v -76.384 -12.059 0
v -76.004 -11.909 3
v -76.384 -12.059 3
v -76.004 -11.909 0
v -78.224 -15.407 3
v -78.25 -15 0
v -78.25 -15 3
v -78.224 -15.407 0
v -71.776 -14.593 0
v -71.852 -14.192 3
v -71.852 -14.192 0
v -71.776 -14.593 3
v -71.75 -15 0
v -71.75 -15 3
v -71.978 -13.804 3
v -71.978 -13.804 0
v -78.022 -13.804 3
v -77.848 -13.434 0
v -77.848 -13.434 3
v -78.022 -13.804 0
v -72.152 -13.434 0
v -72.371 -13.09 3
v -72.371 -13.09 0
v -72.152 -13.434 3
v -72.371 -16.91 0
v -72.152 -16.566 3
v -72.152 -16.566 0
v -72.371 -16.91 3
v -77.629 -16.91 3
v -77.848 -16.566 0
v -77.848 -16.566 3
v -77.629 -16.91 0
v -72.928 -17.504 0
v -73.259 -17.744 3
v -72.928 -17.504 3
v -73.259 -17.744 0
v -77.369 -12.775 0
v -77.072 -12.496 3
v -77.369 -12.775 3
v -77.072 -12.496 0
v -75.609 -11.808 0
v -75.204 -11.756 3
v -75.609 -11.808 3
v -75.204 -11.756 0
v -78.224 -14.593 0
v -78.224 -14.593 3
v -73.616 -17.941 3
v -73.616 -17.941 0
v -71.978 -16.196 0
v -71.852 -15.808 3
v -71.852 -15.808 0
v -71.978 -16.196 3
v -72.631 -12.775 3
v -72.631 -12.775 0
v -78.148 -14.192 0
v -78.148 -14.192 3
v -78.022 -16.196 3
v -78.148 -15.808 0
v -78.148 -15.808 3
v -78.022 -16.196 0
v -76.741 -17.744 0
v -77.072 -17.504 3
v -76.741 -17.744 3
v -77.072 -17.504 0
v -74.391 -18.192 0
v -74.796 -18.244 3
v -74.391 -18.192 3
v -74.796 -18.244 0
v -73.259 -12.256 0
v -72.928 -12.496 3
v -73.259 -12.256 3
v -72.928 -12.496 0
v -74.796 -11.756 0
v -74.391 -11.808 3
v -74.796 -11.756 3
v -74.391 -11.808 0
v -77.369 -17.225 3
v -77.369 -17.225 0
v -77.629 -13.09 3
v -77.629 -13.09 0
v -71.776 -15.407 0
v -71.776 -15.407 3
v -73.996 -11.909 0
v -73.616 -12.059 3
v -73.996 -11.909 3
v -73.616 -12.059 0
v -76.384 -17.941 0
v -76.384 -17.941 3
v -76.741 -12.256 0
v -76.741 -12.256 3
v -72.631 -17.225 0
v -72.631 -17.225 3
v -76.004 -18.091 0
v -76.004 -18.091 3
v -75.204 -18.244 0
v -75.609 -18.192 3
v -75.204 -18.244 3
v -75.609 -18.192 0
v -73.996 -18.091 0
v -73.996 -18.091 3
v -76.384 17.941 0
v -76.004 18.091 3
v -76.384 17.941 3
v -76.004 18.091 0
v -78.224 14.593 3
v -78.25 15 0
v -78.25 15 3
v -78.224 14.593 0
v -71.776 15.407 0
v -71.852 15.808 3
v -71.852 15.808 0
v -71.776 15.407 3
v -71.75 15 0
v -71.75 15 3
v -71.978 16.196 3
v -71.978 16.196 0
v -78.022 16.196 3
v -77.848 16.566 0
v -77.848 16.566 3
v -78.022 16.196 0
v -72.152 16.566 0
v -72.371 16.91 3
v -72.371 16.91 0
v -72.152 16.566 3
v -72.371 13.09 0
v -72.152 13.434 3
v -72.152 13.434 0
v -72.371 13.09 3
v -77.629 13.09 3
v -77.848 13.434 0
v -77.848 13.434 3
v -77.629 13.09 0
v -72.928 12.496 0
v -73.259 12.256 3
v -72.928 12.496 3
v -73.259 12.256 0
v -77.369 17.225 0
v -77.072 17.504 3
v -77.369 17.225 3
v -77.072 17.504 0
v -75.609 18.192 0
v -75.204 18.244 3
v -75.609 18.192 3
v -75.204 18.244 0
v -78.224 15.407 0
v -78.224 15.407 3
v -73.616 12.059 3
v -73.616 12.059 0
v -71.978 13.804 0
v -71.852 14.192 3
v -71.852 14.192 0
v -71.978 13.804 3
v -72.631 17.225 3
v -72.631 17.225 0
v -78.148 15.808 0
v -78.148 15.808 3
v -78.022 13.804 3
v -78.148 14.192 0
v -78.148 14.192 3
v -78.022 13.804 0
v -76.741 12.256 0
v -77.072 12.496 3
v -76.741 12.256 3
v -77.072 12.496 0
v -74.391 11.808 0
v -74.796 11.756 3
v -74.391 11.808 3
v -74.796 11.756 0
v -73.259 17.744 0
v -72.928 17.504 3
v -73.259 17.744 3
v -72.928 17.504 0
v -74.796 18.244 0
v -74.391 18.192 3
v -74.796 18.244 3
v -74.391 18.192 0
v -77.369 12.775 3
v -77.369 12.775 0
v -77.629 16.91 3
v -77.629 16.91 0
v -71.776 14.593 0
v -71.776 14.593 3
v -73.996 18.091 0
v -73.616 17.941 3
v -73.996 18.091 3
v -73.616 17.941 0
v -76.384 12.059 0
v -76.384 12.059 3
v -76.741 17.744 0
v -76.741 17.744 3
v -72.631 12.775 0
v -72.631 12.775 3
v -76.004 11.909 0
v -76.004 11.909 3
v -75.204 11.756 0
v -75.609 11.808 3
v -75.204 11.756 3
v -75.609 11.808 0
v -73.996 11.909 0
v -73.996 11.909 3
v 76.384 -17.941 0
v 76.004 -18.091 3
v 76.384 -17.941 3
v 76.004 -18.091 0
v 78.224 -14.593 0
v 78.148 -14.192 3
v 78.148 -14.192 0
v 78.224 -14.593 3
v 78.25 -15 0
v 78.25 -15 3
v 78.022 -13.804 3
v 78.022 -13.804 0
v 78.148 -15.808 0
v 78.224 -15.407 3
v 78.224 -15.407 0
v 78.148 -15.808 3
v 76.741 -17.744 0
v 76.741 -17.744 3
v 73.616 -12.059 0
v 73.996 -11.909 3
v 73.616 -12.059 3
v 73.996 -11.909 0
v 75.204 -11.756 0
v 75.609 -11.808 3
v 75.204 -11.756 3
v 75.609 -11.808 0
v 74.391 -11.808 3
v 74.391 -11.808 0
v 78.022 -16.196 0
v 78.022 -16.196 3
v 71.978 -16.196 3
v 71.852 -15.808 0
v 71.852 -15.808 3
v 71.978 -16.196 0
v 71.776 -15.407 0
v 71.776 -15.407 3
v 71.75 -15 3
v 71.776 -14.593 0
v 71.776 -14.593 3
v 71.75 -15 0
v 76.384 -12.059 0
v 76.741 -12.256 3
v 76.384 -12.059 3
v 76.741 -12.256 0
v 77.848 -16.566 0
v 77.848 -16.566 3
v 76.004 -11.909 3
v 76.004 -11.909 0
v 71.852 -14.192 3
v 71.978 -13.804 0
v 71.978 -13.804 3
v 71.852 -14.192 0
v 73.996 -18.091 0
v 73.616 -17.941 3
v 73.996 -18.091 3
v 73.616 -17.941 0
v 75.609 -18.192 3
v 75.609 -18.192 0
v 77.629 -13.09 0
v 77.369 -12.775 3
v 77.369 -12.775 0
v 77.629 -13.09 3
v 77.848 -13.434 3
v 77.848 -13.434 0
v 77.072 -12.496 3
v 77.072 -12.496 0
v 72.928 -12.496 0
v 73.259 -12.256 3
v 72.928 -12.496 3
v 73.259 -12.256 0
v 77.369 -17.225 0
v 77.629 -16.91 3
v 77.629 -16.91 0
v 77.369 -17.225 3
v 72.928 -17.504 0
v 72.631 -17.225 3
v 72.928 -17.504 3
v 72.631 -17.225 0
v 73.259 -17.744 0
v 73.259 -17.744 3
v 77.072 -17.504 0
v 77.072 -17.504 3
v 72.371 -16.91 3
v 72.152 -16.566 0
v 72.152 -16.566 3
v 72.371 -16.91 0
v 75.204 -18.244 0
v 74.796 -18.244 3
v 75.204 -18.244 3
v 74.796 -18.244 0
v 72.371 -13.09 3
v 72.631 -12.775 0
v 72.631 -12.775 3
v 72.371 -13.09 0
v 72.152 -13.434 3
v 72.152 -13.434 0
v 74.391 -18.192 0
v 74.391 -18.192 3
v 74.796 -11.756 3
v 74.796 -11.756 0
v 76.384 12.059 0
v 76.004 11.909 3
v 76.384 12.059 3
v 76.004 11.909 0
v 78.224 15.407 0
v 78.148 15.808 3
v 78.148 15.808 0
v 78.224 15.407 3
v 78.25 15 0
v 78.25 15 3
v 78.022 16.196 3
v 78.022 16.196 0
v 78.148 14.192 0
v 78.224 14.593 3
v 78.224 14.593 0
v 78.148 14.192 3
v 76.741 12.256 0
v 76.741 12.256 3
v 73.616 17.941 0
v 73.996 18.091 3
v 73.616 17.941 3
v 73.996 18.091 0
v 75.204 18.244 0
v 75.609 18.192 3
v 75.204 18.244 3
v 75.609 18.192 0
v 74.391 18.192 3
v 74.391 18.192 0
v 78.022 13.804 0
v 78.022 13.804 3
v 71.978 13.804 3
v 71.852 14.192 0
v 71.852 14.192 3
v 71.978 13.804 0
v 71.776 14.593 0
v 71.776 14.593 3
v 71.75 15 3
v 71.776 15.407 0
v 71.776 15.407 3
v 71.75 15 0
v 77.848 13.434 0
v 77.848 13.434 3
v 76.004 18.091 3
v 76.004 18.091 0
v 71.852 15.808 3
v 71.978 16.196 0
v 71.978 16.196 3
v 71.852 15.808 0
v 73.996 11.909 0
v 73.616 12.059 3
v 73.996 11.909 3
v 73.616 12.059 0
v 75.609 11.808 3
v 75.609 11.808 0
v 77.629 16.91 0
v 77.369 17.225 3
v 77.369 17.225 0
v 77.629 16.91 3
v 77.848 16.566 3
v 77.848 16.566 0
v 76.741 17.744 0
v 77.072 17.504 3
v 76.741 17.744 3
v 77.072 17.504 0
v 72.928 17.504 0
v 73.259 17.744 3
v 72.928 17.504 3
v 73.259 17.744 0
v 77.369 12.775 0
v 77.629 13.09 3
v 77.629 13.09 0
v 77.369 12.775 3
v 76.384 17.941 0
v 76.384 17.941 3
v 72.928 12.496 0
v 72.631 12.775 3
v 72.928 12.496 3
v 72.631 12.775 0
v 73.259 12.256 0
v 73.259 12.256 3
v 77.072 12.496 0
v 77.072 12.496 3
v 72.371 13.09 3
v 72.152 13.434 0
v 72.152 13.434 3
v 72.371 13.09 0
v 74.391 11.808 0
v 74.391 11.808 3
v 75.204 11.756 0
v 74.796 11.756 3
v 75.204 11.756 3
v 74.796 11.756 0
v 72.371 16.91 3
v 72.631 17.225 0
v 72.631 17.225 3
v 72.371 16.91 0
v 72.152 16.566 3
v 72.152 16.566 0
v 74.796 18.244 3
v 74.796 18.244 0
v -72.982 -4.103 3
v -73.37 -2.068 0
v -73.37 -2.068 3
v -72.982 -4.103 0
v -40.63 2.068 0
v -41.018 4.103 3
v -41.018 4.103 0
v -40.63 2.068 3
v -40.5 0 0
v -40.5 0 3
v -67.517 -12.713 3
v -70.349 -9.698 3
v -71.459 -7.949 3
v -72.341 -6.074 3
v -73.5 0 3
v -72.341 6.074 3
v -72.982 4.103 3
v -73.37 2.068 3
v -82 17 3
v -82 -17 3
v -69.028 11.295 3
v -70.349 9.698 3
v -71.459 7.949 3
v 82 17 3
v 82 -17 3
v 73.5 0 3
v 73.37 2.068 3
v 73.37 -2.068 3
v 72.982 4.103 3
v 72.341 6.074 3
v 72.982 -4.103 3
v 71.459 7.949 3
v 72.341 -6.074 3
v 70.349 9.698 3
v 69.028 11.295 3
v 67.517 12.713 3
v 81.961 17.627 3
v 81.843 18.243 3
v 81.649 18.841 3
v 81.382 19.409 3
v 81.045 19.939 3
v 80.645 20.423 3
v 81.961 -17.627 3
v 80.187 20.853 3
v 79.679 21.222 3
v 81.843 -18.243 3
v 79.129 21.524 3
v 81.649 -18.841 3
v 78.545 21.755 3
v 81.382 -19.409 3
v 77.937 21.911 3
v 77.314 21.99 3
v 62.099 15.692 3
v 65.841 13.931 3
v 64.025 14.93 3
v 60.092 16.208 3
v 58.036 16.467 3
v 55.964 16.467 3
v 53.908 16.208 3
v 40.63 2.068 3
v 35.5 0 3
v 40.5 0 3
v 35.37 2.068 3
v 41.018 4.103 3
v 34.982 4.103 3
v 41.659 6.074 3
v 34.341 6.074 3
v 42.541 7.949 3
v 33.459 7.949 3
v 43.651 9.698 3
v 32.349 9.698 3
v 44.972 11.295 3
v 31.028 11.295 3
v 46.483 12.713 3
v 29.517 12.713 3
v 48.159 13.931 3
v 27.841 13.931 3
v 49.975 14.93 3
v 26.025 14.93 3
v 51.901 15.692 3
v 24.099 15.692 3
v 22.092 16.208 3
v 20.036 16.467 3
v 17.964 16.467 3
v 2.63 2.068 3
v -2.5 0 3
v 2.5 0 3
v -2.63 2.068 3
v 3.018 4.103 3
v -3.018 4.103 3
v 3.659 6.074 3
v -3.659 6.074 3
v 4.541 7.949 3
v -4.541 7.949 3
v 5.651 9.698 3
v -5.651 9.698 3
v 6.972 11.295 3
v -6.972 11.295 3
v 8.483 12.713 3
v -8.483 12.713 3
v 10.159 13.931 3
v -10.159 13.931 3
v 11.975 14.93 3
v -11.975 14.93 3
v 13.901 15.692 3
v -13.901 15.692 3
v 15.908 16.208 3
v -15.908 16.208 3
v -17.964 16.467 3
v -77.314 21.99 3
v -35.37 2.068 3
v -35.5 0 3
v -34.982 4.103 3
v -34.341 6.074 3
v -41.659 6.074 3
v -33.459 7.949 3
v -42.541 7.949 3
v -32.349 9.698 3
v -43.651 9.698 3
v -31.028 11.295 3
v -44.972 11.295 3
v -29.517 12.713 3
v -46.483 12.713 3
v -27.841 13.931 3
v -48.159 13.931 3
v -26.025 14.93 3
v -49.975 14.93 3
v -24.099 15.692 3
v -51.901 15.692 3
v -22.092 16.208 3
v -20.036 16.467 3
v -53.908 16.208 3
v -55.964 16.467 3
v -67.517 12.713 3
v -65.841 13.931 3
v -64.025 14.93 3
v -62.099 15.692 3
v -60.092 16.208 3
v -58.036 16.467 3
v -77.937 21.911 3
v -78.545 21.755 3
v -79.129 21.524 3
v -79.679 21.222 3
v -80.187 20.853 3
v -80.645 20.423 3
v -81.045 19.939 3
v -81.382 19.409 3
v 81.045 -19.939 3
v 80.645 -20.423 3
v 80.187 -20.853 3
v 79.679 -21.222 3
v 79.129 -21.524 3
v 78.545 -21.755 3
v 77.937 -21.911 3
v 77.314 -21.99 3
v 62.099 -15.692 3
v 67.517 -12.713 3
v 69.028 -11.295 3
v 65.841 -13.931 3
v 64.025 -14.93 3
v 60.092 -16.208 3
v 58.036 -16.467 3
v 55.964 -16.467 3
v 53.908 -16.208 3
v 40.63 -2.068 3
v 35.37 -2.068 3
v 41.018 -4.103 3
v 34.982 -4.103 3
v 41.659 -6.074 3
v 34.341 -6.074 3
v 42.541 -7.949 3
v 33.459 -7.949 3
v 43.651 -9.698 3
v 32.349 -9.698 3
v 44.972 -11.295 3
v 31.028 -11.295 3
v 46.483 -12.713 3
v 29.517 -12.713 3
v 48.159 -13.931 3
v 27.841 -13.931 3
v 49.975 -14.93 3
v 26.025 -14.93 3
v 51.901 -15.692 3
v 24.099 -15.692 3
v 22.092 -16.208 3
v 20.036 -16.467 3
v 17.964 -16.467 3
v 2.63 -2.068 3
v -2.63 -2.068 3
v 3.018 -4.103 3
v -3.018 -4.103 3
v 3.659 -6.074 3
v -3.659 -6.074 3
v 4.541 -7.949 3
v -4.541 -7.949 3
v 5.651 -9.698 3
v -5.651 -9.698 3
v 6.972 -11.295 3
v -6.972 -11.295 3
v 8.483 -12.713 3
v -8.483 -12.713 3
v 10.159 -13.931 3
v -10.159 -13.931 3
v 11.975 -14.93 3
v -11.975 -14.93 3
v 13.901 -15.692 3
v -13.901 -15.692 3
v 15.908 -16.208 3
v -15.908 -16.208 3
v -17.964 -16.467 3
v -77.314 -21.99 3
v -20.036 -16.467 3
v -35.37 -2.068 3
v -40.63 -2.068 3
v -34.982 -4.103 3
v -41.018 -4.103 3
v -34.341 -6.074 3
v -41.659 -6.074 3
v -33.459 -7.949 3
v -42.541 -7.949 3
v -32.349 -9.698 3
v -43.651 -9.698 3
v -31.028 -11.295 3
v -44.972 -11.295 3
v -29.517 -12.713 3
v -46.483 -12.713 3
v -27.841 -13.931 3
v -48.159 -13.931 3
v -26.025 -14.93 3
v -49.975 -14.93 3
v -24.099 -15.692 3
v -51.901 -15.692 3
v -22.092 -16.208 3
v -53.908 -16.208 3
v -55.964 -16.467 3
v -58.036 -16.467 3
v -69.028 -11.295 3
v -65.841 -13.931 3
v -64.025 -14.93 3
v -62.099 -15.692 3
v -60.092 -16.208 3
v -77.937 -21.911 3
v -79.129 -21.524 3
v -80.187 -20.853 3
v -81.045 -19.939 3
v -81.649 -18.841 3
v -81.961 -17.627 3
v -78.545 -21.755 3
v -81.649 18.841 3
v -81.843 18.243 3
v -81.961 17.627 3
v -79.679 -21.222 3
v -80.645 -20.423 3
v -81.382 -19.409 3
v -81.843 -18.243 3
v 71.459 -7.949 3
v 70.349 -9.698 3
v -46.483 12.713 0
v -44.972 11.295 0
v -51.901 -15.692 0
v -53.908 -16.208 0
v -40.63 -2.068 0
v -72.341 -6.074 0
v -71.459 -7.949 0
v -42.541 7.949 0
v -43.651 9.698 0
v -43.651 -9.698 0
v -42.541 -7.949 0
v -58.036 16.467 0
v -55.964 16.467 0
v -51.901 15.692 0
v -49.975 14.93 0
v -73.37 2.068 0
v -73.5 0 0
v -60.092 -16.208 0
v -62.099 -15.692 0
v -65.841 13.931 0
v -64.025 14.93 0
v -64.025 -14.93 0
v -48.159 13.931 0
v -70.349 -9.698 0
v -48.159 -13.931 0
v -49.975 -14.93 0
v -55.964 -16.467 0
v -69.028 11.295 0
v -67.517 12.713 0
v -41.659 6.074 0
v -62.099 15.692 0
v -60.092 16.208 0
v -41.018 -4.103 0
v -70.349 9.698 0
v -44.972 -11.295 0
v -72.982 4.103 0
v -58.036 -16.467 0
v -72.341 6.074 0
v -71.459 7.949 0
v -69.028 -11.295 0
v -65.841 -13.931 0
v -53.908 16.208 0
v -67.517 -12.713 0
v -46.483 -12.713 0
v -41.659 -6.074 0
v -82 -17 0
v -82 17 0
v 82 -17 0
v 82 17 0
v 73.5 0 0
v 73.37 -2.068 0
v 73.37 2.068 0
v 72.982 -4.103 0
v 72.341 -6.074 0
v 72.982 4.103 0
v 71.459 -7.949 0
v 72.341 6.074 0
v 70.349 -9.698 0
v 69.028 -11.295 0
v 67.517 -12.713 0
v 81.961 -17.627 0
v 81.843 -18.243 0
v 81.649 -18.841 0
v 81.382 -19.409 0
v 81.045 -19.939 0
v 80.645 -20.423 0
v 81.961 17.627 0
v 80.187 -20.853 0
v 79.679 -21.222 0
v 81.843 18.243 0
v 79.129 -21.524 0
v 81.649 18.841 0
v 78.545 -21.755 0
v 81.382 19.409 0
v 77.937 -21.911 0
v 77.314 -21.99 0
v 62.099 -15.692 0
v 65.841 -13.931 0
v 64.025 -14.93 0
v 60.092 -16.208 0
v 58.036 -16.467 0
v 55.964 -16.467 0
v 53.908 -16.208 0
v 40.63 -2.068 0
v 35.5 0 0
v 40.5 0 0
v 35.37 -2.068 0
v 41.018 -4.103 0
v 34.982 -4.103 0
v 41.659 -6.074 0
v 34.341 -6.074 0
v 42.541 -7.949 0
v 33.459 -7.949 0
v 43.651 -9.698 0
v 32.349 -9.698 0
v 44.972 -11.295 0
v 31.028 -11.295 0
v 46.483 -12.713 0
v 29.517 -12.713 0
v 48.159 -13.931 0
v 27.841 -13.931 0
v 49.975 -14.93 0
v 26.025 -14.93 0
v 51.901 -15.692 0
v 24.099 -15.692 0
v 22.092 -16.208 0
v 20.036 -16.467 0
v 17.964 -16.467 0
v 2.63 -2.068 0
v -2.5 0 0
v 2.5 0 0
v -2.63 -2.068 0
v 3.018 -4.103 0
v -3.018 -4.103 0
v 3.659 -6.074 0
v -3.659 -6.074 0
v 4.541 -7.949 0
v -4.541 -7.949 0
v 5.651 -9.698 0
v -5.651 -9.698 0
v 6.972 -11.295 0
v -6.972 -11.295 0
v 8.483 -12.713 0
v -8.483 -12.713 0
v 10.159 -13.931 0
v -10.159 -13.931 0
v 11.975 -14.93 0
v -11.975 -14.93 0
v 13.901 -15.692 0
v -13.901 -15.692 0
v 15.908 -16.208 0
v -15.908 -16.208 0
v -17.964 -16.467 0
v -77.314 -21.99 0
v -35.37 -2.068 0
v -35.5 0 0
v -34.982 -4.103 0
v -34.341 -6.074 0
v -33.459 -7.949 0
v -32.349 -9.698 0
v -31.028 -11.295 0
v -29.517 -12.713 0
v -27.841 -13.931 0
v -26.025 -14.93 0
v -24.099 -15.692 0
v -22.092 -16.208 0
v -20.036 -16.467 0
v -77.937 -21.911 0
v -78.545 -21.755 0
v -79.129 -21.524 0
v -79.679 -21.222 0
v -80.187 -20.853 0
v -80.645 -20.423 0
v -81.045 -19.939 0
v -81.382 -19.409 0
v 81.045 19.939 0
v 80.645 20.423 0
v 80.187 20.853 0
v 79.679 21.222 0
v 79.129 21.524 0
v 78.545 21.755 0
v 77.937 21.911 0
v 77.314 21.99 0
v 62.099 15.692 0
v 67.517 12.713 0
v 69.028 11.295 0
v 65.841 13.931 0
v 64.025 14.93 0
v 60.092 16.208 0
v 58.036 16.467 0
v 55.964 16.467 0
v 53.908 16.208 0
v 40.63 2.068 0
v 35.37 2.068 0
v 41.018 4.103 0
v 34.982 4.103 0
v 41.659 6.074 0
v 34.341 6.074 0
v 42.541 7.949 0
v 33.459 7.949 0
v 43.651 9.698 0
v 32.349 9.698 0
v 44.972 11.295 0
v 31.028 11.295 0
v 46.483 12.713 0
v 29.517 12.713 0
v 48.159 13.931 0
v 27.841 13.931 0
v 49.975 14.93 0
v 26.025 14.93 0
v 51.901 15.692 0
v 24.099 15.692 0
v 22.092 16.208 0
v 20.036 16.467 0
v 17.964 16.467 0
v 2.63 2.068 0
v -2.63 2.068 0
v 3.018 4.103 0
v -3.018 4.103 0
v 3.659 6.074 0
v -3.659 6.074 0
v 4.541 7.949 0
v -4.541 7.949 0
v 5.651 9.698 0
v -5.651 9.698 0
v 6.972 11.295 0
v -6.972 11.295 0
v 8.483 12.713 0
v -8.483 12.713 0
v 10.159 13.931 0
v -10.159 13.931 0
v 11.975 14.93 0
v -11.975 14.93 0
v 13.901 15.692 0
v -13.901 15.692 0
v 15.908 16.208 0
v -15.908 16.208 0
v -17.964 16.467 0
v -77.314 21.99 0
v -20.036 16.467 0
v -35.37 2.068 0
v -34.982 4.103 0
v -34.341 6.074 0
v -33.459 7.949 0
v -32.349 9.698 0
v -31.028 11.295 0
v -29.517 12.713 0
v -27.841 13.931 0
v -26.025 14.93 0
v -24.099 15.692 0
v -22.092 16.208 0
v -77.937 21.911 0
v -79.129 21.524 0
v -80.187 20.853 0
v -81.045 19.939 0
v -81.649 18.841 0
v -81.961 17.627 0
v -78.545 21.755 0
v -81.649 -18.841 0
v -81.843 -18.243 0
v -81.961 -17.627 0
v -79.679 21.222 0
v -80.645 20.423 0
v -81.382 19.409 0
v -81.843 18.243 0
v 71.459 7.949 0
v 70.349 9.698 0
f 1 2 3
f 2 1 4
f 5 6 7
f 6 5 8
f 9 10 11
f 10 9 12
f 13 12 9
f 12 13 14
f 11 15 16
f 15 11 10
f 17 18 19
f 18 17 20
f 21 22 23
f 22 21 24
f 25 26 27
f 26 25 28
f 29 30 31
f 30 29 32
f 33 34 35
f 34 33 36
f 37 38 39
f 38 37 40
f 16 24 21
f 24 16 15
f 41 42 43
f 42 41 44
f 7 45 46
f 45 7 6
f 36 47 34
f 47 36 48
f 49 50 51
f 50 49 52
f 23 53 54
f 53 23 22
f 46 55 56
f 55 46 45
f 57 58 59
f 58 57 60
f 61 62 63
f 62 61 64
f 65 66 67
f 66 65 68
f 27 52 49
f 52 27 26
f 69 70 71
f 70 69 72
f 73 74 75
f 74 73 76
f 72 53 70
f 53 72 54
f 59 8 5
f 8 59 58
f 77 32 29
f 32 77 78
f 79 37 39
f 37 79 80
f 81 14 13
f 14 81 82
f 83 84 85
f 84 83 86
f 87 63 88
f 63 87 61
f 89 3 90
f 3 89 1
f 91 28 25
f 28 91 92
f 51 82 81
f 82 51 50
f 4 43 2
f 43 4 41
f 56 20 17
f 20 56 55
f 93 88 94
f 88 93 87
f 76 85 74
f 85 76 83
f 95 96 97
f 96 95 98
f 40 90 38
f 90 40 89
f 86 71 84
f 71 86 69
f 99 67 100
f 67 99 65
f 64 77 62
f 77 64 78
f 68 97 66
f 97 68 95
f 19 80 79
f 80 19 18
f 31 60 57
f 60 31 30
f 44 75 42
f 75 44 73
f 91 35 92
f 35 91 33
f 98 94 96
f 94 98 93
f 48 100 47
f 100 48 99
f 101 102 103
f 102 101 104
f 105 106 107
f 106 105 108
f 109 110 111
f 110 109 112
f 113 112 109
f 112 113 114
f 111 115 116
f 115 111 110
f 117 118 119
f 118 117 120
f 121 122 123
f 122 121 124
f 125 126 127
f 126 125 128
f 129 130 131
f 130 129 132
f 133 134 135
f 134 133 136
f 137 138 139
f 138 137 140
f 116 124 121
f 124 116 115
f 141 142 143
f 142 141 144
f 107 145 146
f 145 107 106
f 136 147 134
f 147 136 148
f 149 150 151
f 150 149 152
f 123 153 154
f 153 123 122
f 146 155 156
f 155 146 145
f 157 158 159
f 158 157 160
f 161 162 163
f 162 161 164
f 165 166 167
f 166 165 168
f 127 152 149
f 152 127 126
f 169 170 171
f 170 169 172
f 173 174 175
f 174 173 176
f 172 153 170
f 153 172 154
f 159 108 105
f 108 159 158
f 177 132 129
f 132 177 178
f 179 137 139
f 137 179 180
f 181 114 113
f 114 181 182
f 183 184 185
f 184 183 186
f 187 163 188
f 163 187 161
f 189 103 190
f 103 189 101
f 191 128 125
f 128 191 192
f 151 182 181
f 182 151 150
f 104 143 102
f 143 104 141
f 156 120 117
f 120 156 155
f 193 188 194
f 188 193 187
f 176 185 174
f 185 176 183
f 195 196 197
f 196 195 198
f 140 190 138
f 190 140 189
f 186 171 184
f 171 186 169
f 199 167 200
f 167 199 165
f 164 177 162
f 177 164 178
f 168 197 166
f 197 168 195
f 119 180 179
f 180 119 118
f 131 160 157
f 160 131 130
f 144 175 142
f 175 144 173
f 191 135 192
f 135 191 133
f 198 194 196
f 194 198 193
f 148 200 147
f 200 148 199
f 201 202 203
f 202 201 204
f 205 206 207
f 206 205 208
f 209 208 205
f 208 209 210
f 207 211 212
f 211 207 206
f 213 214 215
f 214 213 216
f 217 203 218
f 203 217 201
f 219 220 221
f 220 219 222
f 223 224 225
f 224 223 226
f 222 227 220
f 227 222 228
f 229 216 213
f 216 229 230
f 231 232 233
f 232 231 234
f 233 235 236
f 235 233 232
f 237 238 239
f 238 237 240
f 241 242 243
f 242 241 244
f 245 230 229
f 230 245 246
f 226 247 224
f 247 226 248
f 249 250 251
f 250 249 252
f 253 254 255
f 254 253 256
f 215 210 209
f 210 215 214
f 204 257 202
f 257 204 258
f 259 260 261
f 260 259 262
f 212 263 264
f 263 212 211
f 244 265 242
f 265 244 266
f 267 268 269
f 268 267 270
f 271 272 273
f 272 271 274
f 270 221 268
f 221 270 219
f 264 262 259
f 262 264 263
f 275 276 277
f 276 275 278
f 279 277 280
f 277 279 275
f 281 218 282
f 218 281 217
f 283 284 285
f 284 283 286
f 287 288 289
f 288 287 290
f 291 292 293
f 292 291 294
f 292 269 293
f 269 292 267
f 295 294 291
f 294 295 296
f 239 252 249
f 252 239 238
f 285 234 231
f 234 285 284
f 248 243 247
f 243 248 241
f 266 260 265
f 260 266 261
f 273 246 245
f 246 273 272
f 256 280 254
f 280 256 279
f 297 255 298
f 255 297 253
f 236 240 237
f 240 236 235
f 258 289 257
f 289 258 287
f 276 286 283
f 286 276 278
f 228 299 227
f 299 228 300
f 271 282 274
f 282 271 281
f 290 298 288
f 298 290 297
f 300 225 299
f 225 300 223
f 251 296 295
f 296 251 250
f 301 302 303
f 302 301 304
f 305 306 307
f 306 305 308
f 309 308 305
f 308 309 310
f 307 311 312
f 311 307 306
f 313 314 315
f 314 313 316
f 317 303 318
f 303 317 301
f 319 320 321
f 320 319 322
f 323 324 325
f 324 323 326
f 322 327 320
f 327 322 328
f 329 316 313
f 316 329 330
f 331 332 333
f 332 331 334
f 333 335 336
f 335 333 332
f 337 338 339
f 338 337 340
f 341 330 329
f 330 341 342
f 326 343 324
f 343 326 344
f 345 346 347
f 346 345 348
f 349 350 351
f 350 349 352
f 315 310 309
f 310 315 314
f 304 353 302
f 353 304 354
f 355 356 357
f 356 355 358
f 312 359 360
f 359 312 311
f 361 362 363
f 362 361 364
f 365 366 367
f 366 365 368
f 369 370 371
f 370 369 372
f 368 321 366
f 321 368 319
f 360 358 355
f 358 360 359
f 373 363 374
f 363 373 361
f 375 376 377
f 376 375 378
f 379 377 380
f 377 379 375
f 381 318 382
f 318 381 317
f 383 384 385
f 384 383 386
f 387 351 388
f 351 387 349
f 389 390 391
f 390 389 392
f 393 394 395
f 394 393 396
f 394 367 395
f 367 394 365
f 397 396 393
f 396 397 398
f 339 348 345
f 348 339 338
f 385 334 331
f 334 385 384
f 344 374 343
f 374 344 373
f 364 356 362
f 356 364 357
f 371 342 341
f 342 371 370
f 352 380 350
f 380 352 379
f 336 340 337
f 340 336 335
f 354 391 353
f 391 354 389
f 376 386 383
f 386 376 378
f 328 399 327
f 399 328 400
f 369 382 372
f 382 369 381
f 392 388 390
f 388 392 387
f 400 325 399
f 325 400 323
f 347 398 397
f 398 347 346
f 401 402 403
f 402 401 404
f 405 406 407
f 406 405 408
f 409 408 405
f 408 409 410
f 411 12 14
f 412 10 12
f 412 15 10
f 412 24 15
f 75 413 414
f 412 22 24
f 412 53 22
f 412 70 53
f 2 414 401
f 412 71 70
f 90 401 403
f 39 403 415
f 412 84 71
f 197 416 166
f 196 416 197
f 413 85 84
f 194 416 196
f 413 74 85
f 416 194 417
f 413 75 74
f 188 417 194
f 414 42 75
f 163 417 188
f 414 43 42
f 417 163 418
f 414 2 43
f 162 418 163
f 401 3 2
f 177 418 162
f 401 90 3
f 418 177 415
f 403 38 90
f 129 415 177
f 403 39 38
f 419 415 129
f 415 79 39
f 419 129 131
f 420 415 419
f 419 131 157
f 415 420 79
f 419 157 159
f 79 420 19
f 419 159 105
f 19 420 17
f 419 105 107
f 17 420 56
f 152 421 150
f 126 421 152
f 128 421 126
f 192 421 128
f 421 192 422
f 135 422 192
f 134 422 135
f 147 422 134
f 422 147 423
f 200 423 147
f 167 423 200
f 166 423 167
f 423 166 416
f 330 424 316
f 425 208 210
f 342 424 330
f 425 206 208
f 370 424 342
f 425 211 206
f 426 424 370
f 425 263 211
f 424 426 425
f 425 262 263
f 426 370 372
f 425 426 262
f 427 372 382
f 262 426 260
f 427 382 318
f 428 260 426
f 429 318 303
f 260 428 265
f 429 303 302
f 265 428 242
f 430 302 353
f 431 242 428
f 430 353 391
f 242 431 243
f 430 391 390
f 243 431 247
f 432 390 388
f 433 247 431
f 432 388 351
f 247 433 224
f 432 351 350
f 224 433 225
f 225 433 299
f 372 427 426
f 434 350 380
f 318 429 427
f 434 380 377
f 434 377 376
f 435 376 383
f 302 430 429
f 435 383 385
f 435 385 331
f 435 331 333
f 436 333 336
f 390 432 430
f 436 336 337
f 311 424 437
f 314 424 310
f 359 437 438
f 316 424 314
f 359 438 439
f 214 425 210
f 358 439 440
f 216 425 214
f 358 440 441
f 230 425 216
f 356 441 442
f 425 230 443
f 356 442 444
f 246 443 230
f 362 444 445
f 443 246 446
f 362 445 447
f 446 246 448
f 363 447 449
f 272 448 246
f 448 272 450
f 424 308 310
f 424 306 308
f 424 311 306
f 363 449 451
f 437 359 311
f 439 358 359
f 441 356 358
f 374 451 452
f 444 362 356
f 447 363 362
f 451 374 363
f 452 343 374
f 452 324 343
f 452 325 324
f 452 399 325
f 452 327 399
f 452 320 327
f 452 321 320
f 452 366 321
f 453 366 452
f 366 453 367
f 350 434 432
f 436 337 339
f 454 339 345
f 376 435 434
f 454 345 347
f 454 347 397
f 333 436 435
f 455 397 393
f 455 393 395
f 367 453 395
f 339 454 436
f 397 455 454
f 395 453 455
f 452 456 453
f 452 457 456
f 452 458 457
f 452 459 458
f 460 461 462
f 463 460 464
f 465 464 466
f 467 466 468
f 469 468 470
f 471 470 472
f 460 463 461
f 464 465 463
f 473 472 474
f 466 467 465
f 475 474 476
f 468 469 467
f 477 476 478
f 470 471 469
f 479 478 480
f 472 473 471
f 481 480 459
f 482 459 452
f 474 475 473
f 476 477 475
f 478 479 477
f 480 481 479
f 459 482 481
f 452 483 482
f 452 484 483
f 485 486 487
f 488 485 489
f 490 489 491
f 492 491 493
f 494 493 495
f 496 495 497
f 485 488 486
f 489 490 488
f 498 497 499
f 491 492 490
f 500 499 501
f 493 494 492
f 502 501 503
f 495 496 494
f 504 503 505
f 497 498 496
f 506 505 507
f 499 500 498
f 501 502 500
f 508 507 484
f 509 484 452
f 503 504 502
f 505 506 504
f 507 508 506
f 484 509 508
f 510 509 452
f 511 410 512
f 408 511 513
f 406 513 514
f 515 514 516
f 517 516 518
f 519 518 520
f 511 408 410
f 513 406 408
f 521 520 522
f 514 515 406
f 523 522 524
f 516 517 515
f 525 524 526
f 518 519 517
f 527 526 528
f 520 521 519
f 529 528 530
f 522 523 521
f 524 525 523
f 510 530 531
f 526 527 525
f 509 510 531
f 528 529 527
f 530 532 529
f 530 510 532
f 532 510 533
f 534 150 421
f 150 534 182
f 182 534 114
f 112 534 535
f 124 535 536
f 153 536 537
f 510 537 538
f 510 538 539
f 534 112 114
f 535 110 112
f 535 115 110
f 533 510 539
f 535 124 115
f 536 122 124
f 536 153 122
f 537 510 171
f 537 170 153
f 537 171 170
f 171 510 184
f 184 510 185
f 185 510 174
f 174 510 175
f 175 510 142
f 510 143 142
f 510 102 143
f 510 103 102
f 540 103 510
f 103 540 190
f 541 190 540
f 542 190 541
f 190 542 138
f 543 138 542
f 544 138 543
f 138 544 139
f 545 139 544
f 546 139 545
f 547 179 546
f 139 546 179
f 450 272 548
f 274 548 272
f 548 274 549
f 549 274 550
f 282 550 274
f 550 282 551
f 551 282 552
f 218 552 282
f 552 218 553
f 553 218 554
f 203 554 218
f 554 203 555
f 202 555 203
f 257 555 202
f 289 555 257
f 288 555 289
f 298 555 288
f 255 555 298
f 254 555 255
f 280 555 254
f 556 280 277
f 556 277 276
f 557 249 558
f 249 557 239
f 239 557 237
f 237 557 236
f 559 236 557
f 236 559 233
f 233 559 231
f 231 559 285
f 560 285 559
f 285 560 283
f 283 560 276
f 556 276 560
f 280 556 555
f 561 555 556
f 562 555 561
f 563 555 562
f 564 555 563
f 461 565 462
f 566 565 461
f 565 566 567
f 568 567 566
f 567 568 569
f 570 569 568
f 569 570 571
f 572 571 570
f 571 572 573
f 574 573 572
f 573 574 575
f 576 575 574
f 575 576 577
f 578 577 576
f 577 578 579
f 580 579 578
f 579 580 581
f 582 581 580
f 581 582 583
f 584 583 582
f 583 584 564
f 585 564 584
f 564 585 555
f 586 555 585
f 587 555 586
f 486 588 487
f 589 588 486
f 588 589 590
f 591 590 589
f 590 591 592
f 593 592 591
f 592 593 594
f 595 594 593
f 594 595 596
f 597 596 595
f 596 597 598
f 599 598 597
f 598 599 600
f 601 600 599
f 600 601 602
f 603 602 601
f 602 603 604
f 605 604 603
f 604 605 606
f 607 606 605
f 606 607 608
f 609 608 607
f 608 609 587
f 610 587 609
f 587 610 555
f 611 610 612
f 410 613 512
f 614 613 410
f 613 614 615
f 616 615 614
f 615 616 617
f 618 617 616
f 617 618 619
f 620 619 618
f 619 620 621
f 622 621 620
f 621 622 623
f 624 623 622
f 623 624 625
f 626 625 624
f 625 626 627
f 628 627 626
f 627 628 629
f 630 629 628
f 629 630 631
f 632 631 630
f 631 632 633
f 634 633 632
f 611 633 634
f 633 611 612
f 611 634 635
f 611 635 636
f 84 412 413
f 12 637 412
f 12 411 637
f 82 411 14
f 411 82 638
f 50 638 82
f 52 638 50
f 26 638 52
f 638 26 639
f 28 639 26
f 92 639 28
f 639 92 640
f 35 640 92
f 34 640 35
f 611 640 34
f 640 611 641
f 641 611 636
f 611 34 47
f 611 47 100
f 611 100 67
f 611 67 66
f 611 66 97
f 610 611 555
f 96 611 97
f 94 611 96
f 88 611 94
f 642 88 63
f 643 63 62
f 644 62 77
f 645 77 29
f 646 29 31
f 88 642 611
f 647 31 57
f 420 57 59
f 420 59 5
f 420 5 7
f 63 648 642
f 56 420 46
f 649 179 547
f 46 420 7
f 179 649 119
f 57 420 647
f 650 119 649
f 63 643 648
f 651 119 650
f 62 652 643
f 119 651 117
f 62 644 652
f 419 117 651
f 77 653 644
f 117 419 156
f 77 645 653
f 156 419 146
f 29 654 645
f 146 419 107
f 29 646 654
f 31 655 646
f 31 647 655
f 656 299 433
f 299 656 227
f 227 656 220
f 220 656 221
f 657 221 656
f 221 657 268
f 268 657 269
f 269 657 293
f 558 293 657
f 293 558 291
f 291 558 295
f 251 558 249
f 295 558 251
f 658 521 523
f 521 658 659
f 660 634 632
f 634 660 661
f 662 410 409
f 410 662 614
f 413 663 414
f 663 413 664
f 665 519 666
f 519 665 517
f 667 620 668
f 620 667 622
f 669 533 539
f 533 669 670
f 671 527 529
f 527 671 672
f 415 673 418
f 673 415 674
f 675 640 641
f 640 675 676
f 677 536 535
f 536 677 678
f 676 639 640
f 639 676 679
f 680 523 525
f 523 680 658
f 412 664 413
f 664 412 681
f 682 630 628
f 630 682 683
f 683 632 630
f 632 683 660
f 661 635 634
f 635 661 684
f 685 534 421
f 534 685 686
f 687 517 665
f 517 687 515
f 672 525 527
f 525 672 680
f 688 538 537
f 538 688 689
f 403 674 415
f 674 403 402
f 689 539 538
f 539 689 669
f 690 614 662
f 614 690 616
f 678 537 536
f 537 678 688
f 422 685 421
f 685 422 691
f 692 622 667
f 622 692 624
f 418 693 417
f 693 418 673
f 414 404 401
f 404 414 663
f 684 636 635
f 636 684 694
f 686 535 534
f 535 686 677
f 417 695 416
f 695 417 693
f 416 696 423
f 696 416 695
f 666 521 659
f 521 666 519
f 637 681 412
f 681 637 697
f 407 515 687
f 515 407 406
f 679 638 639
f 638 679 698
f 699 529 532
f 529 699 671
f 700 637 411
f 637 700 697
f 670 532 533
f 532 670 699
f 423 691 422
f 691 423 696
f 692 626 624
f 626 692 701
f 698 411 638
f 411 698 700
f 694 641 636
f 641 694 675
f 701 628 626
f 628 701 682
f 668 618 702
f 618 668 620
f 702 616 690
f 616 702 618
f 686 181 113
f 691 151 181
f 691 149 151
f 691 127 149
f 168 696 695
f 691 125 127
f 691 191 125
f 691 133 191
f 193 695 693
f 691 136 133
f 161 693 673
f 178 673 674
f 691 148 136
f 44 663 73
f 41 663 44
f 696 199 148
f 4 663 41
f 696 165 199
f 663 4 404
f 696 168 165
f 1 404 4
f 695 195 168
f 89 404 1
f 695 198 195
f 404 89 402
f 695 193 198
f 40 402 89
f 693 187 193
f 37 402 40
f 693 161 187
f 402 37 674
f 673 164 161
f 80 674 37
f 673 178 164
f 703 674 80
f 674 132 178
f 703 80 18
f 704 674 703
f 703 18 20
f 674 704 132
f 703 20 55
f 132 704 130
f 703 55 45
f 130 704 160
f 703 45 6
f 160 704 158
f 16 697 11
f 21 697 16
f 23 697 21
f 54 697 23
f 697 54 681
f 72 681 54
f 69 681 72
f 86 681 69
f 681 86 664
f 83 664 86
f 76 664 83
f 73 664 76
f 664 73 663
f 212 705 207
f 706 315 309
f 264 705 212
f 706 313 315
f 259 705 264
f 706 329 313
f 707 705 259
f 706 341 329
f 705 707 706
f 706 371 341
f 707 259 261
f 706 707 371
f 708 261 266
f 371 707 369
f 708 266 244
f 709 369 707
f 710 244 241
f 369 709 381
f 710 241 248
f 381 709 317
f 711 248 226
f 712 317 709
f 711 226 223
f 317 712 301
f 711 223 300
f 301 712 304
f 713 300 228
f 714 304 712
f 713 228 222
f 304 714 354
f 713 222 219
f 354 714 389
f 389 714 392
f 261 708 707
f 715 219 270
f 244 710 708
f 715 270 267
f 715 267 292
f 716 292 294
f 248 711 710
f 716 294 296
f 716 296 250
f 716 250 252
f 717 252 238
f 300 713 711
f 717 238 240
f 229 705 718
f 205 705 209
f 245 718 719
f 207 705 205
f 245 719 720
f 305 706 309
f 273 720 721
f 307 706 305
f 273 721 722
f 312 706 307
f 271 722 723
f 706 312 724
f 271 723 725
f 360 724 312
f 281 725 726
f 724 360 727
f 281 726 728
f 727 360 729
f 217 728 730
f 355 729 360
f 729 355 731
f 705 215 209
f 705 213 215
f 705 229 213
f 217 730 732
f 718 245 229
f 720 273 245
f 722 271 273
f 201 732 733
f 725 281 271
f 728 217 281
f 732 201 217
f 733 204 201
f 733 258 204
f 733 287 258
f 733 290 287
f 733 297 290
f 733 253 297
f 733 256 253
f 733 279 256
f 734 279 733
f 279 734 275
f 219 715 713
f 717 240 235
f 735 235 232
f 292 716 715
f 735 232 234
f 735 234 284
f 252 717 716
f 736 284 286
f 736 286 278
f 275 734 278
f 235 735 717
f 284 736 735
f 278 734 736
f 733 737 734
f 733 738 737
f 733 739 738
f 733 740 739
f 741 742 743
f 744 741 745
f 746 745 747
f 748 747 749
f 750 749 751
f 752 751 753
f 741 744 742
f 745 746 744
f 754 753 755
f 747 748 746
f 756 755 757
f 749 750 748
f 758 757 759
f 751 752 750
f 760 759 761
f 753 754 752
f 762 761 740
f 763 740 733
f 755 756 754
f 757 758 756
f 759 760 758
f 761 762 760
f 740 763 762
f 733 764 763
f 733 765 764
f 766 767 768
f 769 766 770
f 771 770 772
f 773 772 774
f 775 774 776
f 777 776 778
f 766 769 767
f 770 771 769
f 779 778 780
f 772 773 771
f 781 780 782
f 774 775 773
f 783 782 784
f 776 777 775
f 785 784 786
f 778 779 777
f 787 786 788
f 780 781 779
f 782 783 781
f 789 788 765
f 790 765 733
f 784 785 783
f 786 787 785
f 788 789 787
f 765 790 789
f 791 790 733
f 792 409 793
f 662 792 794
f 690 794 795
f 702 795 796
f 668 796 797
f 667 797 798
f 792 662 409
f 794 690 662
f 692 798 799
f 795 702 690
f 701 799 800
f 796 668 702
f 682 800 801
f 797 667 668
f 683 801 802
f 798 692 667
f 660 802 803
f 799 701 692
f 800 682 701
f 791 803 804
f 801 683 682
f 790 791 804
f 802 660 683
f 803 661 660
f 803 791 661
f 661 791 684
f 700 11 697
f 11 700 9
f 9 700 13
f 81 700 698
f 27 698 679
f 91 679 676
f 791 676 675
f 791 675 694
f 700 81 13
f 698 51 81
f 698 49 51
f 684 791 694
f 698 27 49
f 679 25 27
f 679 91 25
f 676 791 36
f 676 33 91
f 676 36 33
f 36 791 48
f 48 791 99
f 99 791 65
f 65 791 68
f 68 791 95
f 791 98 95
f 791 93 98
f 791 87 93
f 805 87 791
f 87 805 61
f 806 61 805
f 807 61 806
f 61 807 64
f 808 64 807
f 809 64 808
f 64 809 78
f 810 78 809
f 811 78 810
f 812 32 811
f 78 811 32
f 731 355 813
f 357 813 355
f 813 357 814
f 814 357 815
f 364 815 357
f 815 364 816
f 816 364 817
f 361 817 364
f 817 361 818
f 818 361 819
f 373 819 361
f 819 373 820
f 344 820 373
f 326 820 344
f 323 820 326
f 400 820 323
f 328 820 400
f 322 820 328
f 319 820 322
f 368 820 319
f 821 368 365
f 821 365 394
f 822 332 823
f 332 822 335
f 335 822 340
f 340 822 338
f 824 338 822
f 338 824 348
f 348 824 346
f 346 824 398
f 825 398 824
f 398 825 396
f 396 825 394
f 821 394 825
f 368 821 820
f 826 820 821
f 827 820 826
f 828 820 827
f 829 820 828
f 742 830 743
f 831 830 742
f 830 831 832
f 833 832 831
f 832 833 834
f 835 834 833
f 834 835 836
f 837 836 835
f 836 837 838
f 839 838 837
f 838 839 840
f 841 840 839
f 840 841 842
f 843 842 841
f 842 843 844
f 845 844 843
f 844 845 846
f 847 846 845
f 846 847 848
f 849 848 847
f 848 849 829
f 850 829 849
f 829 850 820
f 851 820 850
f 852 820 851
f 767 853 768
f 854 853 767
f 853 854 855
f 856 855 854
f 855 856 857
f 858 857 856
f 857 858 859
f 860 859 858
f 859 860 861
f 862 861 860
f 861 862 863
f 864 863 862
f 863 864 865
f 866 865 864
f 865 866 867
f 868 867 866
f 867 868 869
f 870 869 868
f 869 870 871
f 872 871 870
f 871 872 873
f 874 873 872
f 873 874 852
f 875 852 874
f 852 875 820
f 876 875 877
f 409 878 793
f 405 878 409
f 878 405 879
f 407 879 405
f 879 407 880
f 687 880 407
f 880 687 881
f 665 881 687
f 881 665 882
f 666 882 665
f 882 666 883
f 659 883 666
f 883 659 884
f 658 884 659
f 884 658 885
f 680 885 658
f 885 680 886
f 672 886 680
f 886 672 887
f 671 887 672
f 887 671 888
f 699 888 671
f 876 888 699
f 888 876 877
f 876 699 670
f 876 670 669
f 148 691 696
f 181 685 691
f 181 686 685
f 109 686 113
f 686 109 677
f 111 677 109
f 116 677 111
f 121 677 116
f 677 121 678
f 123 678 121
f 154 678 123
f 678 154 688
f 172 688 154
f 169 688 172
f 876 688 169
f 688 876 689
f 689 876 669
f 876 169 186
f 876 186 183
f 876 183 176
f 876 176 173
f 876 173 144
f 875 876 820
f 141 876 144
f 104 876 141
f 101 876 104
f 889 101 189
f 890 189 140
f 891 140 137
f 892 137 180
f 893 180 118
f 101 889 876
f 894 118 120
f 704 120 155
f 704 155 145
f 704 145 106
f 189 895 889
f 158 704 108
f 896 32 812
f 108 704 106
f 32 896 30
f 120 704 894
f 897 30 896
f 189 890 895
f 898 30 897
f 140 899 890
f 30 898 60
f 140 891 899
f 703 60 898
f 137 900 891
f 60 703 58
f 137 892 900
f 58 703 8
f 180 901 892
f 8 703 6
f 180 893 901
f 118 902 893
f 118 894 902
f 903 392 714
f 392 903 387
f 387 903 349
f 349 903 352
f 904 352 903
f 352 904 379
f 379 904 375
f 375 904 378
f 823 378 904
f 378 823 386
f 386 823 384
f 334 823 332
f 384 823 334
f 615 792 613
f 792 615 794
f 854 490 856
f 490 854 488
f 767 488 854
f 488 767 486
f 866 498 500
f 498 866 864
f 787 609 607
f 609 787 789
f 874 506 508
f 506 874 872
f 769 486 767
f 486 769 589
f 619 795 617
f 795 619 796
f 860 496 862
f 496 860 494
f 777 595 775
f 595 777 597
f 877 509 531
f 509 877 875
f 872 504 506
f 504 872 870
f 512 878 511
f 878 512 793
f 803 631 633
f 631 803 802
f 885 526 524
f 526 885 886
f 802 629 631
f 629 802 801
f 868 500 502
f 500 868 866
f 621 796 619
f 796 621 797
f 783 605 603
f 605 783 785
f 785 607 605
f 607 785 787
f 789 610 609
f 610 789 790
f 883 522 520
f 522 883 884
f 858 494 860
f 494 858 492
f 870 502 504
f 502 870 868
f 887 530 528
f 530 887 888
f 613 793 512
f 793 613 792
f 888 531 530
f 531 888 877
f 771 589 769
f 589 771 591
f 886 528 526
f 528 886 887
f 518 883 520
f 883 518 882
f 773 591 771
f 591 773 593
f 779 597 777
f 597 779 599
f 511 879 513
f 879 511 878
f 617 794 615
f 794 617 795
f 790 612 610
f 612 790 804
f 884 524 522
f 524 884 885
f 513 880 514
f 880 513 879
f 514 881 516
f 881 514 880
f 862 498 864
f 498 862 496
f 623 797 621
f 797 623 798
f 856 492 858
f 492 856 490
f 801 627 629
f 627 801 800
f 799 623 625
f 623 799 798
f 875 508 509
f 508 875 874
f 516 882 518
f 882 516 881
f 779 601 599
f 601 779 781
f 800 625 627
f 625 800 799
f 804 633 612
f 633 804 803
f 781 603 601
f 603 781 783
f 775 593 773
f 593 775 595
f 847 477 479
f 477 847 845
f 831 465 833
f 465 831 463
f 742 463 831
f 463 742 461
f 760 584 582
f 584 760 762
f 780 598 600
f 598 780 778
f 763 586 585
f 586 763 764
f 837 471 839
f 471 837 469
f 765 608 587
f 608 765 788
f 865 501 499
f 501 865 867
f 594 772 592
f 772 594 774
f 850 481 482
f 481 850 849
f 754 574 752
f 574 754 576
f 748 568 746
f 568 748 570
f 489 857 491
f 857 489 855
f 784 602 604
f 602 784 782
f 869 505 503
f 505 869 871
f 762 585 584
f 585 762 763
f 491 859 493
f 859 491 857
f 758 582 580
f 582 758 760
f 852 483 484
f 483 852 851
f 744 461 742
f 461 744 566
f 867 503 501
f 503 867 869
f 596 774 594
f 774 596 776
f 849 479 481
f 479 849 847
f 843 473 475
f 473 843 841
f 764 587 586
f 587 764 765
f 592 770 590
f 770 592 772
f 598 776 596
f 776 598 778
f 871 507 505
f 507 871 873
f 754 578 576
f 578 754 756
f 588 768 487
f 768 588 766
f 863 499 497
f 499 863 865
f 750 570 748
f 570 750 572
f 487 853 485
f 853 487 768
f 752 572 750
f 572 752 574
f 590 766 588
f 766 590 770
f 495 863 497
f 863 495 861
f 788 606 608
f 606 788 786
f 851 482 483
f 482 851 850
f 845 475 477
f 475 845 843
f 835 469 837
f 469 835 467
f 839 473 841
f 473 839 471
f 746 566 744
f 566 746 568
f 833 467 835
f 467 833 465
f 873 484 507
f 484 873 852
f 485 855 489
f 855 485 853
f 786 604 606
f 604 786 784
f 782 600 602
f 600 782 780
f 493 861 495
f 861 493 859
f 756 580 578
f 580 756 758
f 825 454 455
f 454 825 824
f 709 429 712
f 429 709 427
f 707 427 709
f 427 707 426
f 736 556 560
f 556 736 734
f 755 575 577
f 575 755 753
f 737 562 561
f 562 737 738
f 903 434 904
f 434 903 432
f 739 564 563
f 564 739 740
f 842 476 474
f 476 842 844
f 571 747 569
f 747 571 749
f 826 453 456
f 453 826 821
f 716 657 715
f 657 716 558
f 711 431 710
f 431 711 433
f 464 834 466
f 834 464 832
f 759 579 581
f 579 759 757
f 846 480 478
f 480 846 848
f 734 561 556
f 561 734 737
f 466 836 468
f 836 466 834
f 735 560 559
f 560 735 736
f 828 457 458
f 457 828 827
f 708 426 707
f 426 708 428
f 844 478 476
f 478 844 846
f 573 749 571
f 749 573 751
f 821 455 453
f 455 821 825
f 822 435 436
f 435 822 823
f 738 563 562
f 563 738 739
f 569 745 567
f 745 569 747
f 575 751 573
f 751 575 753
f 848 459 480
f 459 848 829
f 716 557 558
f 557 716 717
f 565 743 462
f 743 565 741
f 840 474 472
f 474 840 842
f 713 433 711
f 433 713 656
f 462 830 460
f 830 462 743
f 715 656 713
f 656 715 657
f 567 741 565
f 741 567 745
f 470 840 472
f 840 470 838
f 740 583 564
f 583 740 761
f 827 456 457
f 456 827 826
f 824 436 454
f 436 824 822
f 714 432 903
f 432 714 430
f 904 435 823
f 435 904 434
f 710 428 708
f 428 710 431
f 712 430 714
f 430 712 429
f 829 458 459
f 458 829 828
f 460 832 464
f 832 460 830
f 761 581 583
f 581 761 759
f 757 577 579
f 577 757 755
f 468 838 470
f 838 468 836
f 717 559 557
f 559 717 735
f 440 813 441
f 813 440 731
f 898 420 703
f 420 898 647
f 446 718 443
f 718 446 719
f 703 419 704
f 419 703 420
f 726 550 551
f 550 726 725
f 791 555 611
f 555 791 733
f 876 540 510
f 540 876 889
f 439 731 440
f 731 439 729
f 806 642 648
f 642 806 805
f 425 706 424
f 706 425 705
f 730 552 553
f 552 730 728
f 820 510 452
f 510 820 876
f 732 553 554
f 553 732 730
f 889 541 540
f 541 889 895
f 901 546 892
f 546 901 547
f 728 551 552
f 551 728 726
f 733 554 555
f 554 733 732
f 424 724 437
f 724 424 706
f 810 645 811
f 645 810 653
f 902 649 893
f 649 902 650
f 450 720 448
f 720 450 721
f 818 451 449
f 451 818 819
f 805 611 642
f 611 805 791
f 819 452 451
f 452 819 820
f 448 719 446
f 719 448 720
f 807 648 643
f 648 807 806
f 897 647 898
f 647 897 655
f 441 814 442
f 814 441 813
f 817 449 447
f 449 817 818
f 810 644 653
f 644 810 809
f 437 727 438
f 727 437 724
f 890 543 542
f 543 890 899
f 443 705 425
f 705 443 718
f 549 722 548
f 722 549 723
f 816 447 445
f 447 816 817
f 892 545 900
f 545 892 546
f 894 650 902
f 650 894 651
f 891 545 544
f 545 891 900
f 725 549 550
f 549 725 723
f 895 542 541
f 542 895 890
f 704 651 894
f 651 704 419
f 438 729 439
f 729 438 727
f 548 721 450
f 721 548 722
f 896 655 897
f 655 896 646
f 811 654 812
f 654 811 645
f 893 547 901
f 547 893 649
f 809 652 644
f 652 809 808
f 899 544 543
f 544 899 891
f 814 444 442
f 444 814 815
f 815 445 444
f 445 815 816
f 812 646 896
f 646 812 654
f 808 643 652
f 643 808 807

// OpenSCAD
$fn = 50;


difference() {
	union() {
		hull() {
			translate(v = [-77.0000000000, 17.0000000000, 0]) {
				cylinder(h = 3, r = 5);
			}
			translate(v = [77.0000000000, 17.0000000000, 0]) {
				cylinder(h = 3, r = 5);
			}
			translate(v = [-77.0000000000, -17.0000000000, 0]) {
				cylinder(h = 3, r = 5);
			}
			translate(v = [77.0000000000, -17.0000000000, 0]) {
				cylinder(h = 3, r = 5);
			}
		}
	}
	union() {
		#translate(v = [-75.0000000000, -15.0000000000, -100.0000000000]) {
			cylinder(h = 200, r = 3.2500000000);
		}
		#translate(v = [-75.0000000000, 15.0000000000, -100.0000000000]) {
			cylinder(h = 200, r = 3.2500000000);
		}
		#translate(v = [75.0000000000, -15.0000000000, -100.0000000000]) {
			cylinder(h = 200, r = 3.2500000000);
		}
		#translate(v = [75.0000000000, 15.0000000000, -100.0000000000]) {
			cylinder(h = 200, r = 3.2500000000);
		}
		#translate(v = [-57.0000000000, 0, 0]) {
			cylinder(h = 3, r = 16.5000000000);
		}
		#translate(v = [-19.0000000000, 0, 0]) {
			cylinder(h = 3, r = 16.5000000000);
		}
		#translate(v = [19.0000000000, 0, 0]) {
			cylinder(h = 3, r = 16.5000000000);
		}
		#translate(v = [57.0000000000, 0, 0]) {
			cylinder(h = 3, r = 16.5000000000);
		}
	}
}
